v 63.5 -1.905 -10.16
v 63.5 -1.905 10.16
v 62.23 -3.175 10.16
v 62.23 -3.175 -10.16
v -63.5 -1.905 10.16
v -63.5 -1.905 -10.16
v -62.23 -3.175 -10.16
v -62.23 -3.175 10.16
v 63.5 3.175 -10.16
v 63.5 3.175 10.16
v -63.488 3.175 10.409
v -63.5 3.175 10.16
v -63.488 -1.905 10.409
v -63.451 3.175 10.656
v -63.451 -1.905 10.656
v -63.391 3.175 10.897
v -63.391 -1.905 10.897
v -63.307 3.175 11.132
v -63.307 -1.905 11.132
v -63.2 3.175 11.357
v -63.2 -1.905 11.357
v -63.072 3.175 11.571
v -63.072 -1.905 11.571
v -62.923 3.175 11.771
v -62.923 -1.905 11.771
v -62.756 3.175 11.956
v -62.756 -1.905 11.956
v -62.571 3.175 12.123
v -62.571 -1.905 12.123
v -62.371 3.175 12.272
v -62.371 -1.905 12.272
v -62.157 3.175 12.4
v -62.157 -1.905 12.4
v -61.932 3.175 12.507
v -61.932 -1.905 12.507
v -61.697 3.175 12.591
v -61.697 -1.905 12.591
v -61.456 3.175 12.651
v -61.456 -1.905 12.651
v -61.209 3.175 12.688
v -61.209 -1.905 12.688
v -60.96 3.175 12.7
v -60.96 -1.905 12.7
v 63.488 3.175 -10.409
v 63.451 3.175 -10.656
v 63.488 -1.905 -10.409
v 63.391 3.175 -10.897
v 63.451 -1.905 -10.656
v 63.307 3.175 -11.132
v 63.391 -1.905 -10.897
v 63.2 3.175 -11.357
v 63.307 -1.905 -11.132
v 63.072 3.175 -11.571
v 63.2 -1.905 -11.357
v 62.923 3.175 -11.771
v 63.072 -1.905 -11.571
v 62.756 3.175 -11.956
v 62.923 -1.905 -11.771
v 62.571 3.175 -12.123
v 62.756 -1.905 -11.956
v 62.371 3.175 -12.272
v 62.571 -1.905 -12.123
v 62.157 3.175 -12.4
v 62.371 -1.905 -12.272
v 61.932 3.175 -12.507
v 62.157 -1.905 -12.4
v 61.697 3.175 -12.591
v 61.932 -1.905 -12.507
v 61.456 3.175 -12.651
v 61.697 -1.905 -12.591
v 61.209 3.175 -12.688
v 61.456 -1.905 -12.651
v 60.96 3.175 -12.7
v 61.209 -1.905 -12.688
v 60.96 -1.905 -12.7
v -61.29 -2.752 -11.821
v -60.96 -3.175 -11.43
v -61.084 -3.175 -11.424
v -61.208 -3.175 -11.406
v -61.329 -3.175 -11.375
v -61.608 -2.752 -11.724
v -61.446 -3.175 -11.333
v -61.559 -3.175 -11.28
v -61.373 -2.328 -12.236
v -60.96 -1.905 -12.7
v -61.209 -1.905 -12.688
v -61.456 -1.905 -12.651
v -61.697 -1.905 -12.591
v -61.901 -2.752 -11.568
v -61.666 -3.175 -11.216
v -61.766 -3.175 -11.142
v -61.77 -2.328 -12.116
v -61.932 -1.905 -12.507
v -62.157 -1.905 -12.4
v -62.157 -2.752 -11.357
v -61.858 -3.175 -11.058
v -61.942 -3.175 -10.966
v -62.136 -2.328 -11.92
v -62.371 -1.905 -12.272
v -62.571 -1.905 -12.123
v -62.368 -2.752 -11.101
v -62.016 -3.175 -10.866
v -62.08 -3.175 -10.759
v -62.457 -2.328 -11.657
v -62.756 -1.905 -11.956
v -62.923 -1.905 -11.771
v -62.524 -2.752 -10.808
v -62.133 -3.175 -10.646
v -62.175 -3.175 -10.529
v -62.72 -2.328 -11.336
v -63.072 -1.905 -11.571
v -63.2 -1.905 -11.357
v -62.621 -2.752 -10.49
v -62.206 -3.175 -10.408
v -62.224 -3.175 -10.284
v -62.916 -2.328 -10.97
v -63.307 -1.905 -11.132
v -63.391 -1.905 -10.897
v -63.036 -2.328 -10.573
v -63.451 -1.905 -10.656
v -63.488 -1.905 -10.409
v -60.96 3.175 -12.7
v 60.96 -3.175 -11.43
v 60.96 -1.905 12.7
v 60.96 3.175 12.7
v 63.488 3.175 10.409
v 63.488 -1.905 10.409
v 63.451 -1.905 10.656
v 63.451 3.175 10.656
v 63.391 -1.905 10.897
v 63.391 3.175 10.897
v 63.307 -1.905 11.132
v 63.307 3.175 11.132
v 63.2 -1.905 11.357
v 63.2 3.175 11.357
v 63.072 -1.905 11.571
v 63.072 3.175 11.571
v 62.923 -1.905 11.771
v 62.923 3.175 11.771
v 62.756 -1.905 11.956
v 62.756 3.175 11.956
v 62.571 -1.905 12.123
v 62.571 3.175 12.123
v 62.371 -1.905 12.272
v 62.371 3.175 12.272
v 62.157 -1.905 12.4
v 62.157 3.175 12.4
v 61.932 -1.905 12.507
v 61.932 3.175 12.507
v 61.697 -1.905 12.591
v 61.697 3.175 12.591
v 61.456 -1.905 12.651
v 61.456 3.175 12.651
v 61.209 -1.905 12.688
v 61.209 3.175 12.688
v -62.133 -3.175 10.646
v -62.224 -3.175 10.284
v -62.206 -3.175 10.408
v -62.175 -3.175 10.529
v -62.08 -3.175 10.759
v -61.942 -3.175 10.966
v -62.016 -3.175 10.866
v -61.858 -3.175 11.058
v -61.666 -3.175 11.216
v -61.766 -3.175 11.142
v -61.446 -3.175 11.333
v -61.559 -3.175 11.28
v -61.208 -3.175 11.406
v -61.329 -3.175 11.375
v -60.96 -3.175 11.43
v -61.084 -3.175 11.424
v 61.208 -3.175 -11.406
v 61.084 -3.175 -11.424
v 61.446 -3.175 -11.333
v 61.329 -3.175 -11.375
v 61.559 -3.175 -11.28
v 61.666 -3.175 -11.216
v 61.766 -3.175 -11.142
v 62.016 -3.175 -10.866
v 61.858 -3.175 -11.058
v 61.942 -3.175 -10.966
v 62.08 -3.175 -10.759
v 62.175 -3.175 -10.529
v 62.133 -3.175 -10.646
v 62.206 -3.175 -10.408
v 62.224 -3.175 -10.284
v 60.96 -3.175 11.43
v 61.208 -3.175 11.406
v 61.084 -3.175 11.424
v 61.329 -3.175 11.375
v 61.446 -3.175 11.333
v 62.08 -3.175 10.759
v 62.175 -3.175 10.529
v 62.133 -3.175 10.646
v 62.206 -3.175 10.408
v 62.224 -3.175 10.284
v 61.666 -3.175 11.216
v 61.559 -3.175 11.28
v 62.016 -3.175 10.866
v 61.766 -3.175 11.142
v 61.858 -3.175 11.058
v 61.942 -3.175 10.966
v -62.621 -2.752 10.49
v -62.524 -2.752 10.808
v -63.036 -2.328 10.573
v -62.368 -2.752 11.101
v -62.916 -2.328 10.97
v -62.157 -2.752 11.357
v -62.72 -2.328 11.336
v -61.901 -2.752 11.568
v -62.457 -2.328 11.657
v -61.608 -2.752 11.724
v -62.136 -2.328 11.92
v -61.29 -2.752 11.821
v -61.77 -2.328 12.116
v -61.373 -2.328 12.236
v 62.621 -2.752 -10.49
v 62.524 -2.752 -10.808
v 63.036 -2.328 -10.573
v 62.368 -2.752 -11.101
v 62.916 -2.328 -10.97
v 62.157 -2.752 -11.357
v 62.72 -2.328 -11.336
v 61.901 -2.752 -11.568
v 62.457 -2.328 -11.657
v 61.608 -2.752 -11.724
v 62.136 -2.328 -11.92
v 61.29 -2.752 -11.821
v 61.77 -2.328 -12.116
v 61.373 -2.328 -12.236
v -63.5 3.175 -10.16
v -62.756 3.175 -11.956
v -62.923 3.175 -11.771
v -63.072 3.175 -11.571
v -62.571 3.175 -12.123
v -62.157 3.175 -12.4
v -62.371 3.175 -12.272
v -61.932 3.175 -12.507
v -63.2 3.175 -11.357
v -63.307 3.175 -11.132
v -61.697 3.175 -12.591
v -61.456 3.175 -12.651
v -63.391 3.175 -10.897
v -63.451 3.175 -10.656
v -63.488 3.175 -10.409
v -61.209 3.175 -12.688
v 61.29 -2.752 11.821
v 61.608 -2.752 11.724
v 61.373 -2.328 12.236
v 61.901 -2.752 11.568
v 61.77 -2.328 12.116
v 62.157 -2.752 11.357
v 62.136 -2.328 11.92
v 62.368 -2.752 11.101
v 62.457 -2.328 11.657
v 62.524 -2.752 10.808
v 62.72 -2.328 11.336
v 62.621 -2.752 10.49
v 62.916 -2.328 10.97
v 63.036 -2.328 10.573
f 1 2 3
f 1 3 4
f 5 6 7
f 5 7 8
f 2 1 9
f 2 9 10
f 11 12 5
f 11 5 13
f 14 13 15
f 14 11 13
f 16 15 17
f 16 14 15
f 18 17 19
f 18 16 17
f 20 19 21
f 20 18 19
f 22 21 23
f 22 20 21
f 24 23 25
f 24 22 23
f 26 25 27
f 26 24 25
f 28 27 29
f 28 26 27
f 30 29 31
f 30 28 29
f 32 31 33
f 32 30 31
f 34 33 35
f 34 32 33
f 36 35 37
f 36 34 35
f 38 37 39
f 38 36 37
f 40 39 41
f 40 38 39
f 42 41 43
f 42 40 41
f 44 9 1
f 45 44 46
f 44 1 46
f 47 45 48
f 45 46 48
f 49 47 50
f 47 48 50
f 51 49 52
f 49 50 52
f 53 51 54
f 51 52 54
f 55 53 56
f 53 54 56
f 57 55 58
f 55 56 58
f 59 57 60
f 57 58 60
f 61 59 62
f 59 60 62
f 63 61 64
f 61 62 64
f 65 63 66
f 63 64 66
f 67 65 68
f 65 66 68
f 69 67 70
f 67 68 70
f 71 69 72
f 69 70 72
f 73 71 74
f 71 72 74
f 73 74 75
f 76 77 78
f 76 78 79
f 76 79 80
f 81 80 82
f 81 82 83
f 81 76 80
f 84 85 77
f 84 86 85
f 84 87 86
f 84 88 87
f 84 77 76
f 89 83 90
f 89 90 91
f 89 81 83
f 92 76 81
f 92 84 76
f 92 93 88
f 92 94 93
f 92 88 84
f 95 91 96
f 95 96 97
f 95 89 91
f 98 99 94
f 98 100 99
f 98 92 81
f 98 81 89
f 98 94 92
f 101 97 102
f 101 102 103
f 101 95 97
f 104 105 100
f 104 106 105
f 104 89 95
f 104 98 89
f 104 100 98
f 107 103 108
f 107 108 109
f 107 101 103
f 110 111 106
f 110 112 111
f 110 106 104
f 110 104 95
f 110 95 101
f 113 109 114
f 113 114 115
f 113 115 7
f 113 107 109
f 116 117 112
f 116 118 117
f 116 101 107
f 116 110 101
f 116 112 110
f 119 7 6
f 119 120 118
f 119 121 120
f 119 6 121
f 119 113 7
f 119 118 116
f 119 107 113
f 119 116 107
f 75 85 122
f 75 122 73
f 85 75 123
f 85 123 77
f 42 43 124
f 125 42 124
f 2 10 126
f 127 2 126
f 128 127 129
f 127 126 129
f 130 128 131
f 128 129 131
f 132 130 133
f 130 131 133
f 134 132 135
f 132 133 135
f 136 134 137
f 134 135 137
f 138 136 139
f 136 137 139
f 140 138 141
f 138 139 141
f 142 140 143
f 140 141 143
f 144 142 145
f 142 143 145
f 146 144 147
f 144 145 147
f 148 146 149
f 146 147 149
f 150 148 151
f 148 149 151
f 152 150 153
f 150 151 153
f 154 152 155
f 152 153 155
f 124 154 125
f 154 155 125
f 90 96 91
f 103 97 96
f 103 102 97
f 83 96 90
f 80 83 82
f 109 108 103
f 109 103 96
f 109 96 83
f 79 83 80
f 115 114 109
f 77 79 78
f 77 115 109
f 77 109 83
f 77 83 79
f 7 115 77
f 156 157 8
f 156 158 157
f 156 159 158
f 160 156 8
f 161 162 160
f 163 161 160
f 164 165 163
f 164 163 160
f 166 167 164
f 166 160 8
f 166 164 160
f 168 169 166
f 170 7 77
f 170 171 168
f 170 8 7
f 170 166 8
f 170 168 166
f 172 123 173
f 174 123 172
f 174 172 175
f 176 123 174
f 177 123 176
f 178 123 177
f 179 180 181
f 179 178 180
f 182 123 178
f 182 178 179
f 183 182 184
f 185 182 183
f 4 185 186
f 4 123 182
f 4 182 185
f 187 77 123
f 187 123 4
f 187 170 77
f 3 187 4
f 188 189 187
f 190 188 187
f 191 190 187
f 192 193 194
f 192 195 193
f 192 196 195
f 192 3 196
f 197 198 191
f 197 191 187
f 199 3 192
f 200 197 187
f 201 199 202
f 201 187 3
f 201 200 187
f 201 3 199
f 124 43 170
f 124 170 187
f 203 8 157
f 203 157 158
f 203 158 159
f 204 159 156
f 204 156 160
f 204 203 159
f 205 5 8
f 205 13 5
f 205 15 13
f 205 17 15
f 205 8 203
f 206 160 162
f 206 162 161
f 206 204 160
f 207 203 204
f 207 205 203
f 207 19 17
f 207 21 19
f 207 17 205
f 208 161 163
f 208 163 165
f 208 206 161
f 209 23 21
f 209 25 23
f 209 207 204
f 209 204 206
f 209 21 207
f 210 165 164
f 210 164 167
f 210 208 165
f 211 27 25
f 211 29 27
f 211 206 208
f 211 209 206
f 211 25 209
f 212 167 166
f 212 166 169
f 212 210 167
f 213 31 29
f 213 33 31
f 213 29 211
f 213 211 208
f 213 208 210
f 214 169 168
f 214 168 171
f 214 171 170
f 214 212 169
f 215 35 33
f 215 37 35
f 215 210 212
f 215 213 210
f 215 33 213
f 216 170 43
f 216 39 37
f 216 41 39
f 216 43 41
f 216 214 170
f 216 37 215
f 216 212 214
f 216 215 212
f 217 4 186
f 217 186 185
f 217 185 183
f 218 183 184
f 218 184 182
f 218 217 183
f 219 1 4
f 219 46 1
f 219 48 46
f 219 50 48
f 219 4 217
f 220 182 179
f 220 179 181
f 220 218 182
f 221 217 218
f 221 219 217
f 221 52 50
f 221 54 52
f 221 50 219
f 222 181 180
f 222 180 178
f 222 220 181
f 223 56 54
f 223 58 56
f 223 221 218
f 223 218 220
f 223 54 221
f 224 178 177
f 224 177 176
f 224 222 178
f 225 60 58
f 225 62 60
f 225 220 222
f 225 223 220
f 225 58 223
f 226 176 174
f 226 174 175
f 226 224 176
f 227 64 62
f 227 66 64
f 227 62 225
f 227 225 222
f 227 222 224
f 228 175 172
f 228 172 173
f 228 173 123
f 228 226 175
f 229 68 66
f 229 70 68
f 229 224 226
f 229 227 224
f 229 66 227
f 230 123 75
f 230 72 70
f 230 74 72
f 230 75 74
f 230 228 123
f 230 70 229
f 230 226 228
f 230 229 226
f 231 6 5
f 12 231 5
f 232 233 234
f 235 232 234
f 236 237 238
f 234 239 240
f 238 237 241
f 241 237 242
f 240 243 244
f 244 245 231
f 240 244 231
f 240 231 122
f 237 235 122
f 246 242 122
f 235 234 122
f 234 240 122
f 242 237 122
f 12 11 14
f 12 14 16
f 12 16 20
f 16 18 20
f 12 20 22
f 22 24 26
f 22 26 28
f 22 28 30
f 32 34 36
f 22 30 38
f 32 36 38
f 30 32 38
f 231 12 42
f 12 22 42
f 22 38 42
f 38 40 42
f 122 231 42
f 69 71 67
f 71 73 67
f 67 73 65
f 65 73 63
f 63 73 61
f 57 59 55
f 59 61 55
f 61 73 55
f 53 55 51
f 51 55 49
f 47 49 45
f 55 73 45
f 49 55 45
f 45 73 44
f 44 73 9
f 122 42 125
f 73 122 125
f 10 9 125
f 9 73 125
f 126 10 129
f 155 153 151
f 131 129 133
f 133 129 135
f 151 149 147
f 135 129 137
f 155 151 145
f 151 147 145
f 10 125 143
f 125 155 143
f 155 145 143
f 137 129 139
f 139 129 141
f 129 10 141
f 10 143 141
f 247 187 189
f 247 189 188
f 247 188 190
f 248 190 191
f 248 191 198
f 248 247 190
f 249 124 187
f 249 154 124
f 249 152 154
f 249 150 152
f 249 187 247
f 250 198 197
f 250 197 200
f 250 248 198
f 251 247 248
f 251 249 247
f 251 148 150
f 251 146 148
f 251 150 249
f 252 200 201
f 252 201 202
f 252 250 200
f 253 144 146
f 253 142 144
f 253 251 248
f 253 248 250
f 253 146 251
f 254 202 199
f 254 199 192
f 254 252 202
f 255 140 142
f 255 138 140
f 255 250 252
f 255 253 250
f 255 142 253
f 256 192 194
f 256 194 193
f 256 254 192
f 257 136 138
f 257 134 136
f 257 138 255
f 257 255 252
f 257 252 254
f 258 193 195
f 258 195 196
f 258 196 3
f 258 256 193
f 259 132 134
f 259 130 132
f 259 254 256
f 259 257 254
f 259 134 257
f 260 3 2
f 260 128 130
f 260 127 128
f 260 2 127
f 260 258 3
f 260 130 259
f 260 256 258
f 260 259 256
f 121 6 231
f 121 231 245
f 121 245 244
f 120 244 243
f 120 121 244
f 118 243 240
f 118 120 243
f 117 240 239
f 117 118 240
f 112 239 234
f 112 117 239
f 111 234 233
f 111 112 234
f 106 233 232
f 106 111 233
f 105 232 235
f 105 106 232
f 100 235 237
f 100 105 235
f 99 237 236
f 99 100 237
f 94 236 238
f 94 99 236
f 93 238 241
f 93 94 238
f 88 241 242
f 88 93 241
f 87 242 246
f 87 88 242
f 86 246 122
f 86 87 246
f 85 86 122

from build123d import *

# Parameters (mm, degrees)
F0_W     = 127
F0_H     = 25.4
F1_DEPTH = 3.175
F2_R     = 2.54
F3_SIZE  = 1.27


with BuildPart() as f1:
    # F0 (on Front) → F1 (new body, symmetric)
    with BuildSketch(Plane.XZ):
        Rectangle(F0_W, F0_H)
    extrude(amount=F1_DEPTH, both=True)

    # F2
    f2_edges = [f1.edges().sort_by_distance(p)[0] for p in [
        (-63.5, 0, -12.7),
        (63.5, 0, -12.7),
        (-63.5, 0, 12.7),
        (63.5, 0, 12.7),
    ]]
    fillet(f2_edges, radius=F2_R)

    # F3
    f3_edges = [f1.edges().sort_by_distance(p)[0] for p in [
        (0, -3.175, 12.7),
        (-63.5, -3.175, 0),
        (0, -3.175, -12.7),
        (63.5, -3.175, 0),
        (62.756051, -3.175, 11.956051),
        (-62.756051, -3.175, 11.956051),
        (-62.756051, -3.175, -11.956051),
        (62.756051, -3.175, -11.956051),
    ]]
    chamfer(f3_edges, length=F3_SIZE)


solid = f1.part
